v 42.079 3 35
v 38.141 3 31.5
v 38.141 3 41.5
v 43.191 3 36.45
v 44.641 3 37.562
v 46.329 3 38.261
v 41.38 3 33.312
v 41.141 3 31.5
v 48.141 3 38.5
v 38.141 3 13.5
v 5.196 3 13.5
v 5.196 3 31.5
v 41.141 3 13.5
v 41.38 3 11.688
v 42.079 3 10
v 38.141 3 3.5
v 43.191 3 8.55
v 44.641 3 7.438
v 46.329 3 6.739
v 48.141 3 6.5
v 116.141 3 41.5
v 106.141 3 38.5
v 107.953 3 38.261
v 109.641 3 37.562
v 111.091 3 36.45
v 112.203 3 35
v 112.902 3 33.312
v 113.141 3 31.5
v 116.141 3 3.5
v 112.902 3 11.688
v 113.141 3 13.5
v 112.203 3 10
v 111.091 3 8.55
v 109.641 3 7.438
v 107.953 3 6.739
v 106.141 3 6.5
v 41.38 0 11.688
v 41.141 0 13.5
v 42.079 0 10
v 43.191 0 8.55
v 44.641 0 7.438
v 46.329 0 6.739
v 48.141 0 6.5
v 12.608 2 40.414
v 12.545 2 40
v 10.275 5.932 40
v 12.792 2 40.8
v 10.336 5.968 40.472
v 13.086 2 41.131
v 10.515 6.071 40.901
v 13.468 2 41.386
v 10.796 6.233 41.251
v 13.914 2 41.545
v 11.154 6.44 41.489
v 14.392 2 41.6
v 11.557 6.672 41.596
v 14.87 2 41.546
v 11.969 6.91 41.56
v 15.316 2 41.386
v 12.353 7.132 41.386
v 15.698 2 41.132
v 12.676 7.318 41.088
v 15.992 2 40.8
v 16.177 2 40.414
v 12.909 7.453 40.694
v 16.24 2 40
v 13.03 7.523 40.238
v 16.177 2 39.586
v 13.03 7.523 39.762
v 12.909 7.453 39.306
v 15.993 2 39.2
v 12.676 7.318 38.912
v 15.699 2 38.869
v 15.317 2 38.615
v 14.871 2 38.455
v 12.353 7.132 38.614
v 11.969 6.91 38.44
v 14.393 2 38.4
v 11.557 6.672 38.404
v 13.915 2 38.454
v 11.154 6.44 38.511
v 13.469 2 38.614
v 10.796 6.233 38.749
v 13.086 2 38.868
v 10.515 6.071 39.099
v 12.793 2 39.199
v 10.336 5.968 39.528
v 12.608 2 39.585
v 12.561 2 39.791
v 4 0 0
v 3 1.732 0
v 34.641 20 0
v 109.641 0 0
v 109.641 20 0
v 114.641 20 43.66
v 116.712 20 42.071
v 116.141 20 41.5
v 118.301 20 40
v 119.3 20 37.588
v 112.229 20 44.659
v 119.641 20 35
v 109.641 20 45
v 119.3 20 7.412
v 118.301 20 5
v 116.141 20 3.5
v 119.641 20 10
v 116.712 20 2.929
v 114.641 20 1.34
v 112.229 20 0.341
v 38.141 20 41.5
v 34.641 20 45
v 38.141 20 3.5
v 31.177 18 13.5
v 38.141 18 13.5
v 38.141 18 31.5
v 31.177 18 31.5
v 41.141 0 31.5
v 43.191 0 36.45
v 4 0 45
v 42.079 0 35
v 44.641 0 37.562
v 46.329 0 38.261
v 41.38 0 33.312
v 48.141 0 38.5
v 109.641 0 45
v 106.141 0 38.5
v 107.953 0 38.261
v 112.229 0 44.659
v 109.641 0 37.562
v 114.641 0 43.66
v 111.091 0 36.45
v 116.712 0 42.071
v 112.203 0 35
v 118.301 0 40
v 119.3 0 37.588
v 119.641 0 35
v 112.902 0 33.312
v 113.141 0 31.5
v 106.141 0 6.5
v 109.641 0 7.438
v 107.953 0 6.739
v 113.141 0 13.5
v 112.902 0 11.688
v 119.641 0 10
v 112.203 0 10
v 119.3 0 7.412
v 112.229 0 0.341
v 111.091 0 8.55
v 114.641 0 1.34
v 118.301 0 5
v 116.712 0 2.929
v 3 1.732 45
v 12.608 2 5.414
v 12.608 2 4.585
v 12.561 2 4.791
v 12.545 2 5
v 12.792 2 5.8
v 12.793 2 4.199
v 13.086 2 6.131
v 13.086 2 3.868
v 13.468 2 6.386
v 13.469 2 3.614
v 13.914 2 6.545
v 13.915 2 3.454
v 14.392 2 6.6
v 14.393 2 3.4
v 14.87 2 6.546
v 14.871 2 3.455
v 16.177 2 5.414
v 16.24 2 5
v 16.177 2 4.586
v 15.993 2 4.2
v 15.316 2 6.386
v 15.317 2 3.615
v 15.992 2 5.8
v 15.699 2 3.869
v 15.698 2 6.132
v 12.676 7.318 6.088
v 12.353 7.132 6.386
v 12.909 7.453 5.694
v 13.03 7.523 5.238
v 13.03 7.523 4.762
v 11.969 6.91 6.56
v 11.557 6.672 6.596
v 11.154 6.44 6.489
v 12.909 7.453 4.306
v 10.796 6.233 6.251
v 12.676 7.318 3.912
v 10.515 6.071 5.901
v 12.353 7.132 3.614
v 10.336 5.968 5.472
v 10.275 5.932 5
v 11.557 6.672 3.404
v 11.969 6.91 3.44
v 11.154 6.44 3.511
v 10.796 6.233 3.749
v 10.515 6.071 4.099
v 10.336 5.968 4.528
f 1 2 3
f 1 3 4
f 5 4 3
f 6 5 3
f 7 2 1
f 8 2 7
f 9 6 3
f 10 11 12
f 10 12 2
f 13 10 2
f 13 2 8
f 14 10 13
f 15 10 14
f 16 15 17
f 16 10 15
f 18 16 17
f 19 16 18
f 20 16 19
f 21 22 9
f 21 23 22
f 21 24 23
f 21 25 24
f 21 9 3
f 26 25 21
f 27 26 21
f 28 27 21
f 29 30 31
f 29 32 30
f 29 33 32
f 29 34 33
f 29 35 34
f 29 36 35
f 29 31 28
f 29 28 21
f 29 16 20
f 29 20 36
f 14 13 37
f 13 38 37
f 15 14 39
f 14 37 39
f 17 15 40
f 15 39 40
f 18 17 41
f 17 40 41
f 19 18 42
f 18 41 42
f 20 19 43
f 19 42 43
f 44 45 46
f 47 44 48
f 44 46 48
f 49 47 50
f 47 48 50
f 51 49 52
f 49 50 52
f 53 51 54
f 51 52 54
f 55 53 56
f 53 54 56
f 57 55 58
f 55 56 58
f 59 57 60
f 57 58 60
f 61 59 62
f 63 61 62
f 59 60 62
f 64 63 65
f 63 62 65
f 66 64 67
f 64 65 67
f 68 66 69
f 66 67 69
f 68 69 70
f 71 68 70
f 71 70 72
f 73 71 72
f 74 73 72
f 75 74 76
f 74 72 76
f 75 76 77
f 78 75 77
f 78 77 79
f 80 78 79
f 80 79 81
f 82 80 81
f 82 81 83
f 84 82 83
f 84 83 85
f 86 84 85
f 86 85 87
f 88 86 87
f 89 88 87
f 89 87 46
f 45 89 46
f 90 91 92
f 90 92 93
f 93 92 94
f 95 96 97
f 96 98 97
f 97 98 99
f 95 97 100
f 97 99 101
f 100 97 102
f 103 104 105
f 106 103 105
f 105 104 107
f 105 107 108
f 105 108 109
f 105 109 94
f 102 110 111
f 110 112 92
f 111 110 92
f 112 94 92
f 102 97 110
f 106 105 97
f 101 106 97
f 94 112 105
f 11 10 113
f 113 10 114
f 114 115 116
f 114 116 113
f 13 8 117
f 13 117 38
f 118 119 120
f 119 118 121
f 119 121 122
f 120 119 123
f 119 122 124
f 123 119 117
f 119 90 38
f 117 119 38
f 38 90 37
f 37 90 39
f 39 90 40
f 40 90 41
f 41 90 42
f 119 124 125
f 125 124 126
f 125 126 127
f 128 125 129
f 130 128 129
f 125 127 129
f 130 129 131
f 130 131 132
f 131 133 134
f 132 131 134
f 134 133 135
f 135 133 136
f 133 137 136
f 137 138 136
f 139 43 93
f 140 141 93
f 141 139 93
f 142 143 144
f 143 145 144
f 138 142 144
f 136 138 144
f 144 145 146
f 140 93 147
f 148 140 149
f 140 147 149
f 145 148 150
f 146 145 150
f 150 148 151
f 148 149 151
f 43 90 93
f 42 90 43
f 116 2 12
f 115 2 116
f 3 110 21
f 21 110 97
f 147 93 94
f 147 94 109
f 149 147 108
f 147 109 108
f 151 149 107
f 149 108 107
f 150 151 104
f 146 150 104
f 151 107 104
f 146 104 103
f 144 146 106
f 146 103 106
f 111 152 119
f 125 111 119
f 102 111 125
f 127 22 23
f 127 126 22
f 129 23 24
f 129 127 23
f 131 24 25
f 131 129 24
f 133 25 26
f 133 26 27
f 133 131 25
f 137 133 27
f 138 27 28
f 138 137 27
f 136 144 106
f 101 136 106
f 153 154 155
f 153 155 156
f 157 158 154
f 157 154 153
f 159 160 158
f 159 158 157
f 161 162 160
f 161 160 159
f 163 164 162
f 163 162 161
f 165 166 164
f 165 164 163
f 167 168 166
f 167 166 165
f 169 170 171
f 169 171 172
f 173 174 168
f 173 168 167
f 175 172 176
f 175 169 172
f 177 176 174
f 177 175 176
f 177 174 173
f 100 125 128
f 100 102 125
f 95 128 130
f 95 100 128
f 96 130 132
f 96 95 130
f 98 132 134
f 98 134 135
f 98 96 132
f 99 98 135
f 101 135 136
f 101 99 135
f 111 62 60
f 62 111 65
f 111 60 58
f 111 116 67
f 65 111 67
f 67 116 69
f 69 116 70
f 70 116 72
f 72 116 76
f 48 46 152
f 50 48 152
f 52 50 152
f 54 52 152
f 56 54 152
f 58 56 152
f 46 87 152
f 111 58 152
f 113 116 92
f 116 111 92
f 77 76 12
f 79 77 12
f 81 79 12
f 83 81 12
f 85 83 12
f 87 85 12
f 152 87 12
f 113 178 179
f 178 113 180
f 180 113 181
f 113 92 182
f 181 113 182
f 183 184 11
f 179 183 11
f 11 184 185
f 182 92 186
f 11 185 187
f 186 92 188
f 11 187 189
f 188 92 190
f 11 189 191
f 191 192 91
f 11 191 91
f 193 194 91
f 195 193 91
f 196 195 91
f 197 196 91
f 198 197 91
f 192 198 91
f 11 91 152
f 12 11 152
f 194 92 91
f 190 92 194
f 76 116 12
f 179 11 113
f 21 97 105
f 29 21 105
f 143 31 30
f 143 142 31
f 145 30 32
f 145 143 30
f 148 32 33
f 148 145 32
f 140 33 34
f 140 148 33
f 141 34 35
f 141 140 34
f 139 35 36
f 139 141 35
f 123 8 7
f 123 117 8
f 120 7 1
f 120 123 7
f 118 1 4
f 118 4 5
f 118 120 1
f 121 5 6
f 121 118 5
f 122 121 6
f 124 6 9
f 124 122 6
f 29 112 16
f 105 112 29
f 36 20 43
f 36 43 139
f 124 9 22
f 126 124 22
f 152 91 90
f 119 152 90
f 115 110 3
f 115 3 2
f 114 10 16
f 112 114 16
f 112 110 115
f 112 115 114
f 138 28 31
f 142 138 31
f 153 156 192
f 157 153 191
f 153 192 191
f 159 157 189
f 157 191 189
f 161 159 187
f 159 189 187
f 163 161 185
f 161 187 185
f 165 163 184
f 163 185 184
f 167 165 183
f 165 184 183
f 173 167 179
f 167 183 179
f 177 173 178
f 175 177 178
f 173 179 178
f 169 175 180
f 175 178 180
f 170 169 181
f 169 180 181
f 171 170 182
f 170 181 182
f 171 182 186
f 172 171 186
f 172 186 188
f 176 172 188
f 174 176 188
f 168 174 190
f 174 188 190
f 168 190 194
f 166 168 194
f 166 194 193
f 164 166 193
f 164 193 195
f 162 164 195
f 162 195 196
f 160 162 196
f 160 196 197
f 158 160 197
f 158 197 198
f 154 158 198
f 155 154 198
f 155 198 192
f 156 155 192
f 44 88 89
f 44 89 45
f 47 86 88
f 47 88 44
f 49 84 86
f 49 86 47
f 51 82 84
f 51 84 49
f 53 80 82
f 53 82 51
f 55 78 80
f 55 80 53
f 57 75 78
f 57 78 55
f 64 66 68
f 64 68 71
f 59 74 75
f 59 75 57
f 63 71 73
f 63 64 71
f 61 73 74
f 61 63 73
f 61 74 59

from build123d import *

# Parameters (mm, degrees)
BOSS_EXTRUDE1_DEPTH = 45
SKETCH2_W           = 78
SKETCH2_H           = 38
CUT_EXTRUDE1_DEPTH  = 17
CUT_EXTRUDE2_REACH  = 130.949
SKETCH3_W           = 72
SKETCH3_H           = 32
FILLET1_R           = 10
FILLET2_R           = 7
CUT_EXTRUDE3_REACH  = 97.222
SKETCH4_W           = 18
SKETCH4_H           = 15
CUT_EXTRUDE4_REACH  = 131.379
SKETCH5_R           = 1.6


with BuildPart() as part:
    # Sketch1 → Boss-Extrude1 (new body)
    with BuildSketch(Plane.XY):
        Polygon((34.641016151, 20), (3, 1.732050808), (4, 0), (119.641016151, 0), (119.641016151, 20), align=None)
    extrude(amount=BOSS_EXTRUDE1_DEPTH)

    # Sketch2 → Cut-Extrude1 (cut)
    with BuildSketch(Plane(origin=(0, 20, 0), x_dir=(1, 0, 0), z_dir=(0, 1, 0))):
        with Locations((77.141016151, -22.5)):
            Rectangle(SKETCH2_W, SKETCH2_H)
    extrude(amount=-CUT_EXTRUDE1_DEPTH, mode=Mode.SUBTRACT)

    # Sketch3 → Cut-Extrude2 (cut, up to next)
    with BuildSketch(Plane(origin=(0, 3, 0), x_dir=(1, 0, 0), z_dir=(0, 1, 0)), mode=Mode.PRIVATE) as cut_extrude2_sk1:
        with Locations((77.141016151, -22.5)):
            Rectangle(SKETCH3_W, SKETCH3_H)
    cut_extrude2_tool1 = extrude(cut_extrude2_sk1.sketch, amount=-CUT_EXTRUDE2_REACH, mode=Mode.PRIVATE) & part.part
    add(cut_extrude2_tool1.solids().sort_by_distance((77.141016, 3, 22.5))[0], mode=Mode.SUBTRACT)

    # Fillet1
    fillet1_edges = [part.edges().sort_by_distance(p)[0] for p in [
        (119.641016151, 10, 45),
        (119.641016151, 10, 0),
    ]]
    fillet(fillet1_edges, radius=FILLET1_R)

    # Fillet2
    fillet2_edges = [part.edges().sort_by_distance(p)[0] for p in [
        (41.141016151, 1.5, 38.5),
        (41.141016151, 1.5, 6.5),
        (113.141016151, 1.5, 6.5),
        (113.141016151, 1.5, 38.5),
    ]]
    fillet(fillet2_edges, radius=FILLET2_R)

    # Cut-Extrude3: up to this plane
    cut_extrude3_end = Plane(origin=(0, 0, 45), z_dir=(-0.5000000000000014, 0.8660254037844379, 0))
    # Sketch4 → Cut-Extrude3 (cut, up to the surface)
    with BuildSketch(Plane(origin=(38.141016151, 0, 0), x_dir=(0, 0, -1), z_dir=(1, 0, 0)), mode=Mode.PRIVATE) as cut_extrude3_sk1:
        with Locations((-22.5, 10.5)):
            Rectangle(SKETCH4_W, SKETCH4_H)
    cut_extrude3_tool1 = split(extrude(cut_extrude3_sk1.sketch, amount=-CUT_EXTRUDE3_REACH, mode=Mode.PRIVATE), bisect_by=cut_extrude3_end, keep=Keep.BOTH, mode=Mode.PRIVATE)
    add(cut_extrude3_tool1.solids().sort_by_distance((38.141016, 10.5, 22.5))[0], mode=Mode.SUBTRACT)

    # Cut-Extrude4: up to this plane
    cut_extrude4_end = Plane(origin=(0, 2, 45), z_dir=(0, 1, 0))
    # Sketch5 → Cut-Extrude4 (cut, up to the surface)
    with BuildSketch(Plane(origin=(0, 0, 0), x_dir=(0.8660254037844378, 0.5000000000000017, 0), z_dir=(-0.5000000000000016, 0.8660254037844377, 0)), mode=Mode.PRIVATE) as cut_extrude4_sk1:
        with Locations(Location((13.464101615, -5, 0), (0, 0, 180))):
            Circle(SKETCH5_R)
    cut_extrude4_tool1 = split(extrude(cut_extrude4_sk1.sketch, amount=-CUT_EXTRUDE4_REACH, mode=Mode.PRIVATE), bisect_by=cut_extrude4_end, keep=Keep.BOTH, mode=Mode.PRIVATE)
    add(cut_extrude4_tool1.solids().sort_by_distance((11.660254, 6.732051, 5))[0], mode=Mode.SUBTRACT)
    # Sketch5 → Cut-Extrude4 (cut, up to the surface)
    with BuildSketch(Plane(origin=(0, 0, 0), x_dir=(0.8660254037844378, 0.5000000000000017, 0), z_dir=(-0.5000000000000016, 0.8660254037844377, 0)), mode=Mode.PRIVATE) as cut_extrude4_sk2:
        with Locations(Location((13.464101615, -40, 0), (0, 0, 180))):
            Circle(SKETCH5_R)
    cut_extrude4_tool2 = split(extrude(cut_extrude4_sk2.sketch, amount=-CUT_EXTRUDE4_REACH, mode=Mode.PRIVATE), bisect_by=cut_extrude4_end, keep=Keep.BOTH, mode=Mode.PRIVATE)
    add(cut_extrude4_tool2.solids().sort_by_distance((11.660254, 6.732051, 40))[0], mode=Mode.SUBTRACT)


solid = part.part
